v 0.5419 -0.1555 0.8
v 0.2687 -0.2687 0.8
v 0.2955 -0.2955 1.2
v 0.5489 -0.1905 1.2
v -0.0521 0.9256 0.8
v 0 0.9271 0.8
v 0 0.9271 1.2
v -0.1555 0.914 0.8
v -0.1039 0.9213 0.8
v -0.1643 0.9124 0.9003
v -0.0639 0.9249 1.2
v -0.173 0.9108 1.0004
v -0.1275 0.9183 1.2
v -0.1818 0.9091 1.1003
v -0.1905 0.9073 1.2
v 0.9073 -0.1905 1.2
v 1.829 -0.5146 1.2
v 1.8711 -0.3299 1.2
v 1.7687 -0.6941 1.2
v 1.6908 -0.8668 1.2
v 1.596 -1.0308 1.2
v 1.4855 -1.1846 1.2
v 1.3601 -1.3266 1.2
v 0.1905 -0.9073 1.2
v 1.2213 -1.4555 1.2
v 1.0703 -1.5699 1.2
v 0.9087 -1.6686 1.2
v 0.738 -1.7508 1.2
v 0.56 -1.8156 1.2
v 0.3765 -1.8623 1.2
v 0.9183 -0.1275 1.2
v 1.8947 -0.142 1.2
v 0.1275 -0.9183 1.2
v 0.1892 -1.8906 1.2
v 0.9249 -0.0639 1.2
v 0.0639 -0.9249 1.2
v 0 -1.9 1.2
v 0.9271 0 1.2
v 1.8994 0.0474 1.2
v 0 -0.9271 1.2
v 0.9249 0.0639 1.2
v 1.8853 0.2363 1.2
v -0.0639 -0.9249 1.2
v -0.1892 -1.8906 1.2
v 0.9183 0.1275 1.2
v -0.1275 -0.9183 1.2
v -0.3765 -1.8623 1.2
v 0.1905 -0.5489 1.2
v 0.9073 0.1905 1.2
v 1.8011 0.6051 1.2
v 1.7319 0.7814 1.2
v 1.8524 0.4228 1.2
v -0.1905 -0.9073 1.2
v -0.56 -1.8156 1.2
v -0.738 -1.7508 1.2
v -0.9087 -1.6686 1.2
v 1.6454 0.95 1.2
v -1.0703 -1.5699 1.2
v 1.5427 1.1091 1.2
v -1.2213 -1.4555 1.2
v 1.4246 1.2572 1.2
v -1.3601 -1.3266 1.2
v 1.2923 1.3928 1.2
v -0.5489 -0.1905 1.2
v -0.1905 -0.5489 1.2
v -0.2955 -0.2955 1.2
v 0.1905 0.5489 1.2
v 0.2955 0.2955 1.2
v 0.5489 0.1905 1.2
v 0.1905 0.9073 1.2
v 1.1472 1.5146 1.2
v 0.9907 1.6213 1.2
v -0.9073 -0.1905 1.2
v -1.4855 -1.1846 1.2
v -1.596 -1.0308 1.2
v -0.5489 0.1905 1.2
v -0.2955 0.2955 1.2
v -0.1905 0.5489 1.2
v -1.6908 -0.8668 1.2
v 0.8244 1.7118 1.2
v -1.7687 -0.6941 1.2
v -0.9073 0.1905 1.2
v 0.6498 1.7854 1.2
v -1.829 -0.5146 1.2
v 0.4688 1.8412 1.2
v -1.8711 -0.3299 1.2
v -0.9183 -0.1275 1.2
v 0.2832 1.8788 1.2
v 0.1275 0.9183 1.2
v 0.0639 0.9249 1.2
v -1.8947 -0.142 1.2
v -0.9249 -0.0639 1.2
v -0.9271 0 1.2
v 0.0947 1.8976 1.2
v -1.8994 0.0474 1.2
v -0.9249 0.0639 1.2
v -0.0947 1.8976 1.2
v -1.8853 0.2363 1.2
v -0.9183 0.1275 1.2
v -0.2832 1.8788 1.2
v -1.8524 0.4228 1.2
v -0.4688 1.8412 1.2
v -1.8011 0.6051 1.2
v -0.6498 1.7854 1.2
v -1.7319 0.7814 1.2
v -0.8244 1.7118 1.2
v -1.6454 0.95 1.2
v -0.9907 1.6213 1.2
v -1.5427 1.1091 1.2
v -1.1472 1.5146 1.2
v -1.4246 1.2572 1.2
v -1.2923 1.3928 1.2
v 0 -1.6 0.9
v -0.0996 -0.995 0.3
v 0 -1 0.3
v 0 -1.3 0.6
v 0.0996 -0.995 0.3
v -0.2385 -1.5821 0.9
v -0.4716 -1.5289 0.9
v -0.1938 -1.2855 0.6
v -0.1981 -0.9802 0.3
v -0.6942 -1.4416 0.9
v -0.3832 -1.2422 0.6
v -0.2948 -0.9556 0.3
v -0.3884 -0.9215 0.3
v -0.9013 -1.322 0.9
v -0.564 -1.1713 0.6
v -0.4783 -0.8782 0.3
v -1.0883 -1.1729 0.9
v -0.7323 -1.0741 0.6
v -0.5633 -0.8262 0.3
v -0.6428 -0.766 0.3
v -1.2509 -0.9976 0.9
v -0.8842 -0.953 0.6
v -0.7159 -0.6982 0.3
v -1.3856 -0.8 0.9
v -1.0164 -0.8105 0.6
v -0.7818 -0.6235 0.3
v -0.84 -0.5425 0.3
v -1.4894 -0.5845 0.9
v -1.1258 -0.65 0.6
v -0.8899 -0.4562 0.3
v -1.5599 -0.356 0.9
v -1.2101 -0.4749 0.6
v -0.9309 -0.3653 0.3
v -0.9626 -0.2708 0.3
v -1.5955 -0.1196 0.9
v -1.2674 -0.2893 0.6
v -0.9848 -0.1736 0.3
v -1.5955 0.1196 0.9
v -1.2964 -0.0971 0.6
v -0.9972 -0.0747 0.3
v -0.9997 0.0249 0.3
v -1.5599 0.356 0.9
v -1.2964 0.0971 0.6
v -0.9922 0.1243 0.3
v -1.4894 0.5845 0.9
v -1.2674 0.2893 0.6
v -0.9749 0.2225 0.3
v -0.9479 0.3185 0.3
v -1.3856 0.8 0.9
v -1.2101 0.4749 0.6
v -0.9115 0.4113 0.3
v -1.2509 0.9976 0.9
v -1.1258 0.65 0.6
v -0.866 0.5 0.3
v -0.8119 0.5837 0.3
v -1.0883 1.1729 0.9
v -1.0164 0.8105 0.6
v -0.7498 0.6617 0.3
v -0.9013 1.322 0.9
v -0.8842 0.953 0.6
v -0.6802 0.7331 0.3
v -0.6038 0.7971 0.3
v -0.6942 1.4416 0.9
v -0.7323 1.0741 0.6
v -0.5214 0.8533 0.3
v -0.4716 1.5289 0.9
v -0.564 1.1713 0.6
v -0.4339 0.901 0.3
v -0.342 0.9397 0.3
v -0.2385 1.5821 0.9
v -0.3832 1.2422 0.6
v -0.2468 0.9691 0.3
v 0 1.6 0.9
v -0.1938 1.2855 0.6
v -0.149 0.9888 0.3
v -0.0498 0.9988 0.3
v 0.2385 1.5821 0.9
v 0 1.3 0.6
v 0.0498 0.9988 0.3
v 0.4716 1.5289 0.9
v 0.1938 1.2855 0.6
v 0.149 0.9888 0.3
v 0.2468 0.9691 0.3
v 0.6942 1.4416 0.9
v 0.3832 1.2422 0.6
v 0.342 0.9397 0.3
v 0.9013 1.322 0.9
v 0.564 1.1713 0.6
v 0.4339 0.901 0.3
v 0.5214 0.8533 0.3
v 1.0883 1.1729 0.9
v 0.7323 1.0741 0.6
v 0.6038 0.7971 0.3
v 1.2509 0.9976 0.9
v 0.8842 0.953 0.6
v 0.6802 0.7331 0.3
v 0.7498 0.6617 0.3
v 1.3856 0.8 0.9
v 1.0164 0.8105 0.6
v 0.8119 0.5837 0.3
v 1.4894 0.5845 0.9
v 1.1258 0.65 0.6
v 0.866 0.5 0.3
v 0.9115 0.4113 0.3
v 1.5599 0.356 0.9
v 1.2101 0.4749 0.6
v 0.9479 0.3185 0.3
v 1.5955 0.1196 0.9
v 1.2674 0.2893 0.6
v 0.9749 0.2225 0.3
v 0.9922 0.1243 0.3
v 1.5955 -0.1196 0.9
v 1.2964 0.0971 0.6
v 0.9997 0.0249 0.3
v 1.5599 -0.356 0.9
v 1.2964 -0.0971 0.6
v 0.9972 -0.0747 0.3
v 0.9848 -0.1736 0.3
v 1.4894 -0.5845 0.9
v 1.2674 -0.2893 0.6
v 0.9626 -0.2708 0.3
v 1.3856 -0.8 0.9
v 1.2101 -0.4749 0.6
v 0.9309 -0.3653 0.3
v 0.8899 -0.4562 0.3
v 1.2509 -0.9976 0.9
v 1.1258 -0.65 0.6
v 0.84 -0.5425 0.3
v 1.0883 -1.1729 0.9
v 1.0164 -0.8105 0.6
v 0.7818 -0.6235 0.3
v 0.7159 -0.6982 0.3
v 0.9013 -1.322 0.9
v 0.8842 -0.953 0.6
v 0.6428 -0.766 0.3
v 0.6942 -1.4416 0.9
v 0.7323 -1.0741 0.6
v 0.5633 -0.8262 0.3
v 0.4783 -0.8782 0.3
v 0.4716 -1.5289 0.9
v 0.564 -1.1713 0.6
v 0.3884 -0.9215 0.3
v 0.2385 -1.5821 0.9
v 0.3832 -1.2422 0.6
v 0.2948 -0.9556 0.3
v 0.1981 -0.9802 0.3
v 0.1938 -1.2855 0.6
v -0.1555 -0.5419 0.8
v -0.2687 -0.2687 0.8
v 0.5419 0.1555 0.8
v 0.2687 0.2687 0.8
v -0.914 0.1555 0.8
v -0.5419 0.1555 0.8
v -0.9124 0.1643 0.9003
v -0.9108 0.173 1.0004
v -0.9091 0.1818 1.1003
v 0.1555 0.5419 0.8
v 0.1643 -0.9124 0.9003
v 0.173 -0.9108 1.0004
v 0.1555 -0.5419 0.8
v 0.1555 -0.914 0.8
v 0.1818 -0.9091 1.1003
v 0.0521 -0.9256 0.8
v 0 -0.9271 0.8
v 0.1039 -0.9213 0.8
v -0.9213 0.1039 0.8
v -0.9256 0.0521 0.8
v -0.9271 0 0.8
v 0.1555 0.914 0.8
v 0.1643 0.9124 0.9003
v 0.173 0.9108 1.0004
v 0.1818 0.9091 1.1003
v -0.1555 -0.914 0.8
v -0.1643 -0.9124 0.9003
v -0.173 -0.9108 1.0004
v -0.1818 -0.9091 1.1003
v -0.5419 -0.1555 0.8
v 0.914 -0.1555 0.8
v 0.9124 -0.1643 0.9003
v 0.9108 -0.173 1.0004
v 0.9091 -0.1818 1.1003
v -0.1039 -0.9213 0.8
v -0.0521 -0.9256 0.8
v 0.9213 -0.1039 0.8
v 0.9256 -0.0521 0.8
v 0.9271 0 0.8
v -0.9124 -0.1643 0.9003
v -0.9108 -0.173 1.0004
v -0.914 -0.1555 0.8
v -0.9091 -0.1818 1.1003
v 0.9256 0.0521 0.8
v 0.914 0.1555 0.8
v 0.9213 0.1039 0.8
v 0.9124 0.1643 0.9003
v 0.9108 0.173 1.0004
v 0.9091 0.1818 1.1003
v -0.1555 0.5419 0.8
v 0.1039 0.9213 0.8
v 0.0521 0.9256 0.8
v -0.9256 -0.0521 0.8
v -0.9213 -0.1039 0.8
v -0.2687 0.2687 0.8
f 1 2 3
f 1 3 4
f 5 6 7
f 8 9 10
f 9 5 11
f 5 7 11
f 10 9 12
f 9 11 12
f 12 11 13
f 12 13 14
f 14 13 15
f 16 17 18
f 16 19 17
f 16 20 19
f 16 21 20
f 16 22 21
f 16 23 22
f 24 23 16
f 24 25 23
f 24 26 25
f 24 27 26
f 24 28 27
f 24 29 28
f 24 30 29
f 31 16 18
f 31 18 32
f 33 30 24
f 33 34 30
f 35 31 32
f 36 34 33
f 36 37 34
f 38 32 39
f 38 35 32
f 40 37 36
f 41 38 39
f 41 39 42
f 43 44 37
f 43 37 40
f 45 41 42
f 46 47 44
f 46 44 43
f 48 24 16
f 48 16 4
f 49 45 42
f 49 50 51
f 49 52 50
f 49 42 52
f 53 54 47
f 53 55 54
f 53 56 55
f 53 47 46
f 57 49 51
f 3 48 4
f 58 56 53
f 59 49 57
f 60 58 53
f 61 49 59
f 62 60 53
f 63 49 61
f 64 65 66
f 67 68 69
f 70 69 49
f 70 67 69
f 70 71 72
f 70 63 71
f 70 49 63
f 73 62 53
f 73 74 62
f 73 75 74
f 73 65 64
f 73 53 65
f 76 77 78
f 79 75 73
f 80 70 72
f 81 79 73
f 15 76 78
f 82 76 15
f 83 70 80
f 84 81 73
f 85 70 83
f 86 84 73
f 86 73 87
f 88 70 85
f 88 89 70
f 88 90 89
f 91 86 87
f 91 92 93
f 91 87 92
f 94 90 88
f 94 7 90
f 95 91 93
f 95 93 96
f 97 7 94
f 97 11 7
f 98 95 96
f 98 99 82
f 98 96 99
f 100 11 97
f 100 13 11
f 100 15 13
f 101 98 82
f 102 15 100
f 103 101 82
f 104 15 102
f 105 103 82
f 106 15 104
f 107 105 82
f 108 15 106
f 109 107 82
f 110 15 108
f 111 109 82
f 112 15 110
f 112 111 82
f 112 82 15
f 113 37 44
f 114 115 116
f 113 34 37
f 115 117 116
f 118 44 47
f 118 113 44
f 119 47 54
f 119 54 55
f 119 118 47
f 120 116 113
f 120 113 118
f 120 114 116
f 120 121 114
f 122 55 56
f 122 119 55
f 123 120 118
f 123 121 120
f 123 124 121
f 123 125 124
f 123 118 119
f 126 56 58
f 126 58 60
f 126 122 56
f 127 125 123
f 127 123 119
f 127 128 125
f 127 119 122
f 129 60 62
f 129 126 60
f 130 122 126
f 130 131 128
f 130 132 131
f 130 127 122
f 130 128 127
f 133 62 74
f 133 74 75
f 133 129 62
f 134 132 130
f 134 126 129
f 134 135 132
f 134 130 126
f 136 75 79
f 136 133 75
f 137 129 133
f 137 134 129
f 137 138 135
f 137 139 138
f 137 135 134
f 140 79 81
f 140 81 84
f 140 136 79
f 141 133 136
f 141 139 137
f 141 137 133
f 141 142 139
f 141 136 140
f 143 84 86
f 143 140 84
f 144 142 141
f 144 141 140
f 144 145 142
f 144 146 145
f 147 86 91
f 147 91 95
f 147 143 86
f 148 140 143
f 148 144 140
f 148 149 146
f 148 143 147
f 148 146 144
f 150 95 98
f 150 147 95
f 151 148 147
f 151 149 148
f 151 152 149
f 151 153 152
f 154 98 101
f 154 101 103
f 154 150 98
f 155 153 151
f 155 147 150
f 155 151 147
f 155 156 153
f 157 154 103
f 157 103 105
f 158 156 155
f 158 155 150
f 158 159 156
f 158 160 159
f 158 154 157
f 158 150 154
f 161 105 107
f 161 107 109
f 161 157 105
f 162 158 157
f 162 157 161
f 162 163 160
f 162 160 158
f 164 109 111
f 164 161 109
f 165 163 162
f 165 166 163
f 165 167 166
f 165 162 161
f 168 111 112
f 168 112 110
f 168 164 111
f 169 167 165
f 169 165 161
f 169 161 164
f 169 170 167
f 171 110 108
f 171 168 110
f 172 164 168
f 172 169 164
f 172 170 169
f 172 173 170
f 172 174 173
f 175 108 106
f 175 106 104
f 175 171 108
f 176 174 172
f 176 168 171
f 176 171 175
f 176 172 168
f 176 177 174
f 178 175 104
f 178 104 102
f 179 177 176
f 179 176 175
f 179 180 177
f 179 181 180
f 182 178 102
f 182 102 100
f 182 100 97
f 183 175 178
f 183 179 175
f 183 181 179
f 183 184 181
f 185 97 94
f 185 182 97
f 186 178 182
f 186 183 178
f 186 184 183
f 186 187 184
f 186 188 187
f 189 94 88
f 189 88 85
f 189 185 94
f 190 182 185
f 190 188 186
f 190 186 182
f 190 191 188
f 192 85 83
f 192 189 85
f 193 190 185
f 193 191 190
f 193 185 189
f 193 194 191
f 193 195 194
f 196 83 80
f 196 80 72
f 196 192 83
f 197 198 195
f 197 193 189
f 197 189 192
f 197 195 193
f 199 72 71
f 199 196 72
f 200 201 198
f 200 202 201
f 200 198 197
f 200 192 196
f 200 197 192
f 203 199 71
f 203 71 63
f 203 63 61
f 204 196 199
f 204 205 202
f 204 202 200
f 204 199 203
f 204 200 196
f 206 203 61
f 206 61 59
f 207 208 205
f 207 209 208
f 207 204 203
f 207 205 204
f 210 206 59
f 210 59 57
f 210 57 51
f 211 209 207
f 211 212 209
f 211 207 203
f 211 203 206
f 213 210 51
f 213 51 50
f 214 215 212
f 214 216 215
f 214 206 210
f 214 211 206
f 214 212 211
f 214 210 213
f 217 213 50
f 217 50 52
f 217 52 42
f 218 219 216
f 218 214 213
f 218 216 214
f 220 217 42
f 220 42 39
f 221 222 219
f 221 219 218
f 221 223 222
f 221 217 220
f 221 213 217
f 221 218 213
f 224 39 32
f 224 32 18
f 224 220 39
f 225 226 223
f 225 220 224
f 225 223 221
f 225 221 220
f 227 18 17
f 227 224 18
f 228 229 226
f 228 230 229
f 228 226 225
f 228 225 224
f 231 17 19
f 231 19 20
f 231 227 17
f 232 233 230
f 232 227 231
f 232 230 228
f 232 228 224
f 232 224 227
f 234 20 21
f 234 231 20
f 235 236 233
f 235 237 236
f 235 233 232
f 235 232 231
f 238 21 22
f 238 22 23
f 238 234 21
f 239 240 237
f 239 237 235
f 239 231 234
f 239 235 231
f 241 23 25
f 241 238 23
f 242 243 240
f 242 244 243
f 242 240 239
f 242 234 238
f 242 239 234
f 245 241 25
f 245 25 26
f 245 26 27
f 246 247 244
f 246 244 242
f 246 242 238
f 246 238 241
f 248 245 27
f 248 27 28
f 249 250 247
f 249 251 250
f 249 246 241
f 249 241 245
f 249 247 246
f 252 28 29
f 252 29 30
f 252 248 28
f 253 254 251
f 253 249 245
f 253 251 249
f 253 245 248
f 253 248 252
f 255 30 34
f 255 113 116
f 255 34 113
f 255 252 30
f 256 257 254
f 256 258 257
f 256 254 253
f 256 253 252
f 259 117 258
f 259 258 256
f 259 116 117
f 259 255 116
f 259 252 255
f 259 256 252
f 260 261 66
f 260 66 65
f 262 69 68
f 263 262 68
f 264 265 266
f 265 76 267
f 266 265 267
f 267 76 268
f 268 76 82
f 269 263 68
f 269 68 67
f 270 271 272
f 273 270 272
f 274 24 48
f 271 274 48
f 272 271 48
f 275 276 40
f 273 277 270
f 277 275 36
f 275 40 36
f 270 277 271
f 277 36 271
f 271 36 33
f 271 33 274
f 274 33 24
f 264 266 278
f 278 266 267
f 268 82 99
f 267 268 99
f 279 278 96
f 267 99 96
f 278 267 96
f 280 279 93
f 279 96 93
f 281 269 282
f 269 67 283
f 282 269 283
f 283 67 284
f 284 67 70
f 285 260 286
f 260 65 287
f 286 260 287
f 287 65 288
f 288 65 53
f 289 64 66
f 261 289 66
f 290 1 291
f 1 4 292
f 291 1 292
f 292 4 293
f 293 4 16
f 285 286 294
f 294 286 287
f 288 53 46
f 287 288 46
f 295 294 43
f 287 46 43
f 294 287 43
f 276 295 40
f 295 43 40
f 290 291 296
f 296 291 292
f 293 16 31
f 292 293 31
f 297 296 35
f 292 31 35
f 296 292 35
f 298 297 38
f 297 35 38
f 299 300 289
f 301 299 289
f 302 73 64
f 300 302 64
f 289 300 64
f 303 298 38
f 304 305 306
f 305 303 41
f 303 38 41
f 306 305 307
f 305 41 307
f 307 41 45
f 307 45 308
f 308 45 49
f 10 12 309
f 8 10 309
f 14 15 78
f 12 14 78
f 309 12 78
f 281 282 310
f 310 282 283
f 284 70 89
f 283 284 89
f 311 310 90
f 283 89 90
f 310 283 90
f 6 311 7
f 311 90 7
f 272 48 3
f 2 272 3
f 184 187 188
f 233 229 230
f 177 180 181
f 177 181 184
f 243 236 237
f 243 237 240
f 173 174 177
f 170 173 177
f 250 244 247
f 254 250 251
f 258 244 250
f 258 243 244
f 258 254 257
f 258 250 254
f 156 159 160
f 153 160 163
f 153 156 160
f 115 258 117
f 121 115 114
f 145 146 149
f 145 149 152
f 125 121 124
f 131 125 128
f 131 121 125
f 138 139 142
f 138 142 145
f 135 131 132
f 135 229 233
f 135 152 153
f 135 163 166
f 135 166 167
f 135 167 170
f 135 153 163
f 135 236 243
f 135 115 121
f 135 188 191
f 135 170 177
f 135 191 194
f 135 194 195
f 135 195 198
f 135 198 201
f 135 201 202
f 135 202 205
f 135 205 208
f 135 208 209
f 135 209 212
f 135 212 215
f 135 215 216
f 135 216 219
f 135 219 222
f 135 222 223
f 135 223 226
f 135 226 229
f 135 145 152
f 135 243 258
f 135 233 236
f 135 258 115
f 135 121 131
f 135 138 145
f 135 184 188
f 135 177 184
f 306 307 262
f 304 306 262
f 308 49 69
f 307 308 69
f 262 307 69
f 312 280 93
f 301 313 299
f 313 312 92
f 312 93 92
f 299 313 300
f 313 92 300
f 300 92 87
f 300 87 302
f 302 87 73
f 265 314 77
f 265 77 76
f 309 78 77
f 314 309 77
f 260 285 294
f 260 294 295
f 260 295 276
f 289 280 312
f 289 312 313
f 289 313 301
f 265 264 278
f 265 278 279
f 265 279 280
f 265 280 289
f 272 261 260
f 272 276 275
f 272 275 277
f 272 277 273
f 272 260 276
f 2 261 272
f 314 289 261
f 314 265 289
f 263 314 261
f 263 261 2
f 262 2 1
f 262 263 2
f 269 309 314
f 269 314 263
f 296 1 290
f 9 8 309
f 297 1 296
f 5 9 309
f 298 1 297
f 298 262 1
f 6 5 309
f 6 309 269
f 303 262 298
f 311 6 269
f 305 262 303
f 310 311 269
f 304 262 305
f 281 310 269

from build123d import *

# Parameters (mm, degrees)
CUT_EXTRUDE1_DEPTH = 0.4
CIRPATTERN1_COUNT  = 4
DRAFT2_ANGLE       = 5


with BuildPart() as part:
    # Sketch3 → Revolve1 (revolve)
    with BuildSketch(Plane(origin=(0, 0, 0), x_dir=(0, 0, -1), z_dir=(1, 0, 0)), mode=Mode.PRIVATE) as revolve1_sk:
        Polygon((-1.2, 0), (-1.2, 1.9), (-0.3, 1), (-0.3, 0), align=None)
    revolve(revolve1_sk.sketch.rotate(Axis((0, 0, 1.2), (0, 0, -1)), 180), axis=Axis((0, 0, 1.2), (0, 0, -1)))

    # Sketch4 → Cut-Extrude1 (cut)
    with BuildSketch(Plane.XY.offset(1.2)):
        with BuildLine():
            Line((0, 0), (0.9271, 0))
            ThreePointArc((0.9271, 0), (0.92214099, 0.095762227), (0.907317012, 0.1905))
            Line((0.907317012, 0.1905), (0.548908506, 0.1905))
            Line((0.548908506, 0.1905), (0.295475421, 0.295475421))
            Line((0.295475421, 0.295475421), (0.1905, 0.548908506))
            Line((0.1905, 0.548908506), (0.1905, 0.907317012))
            ThreePointArc((0.1905, 0.907317012), (0.095762227, 0.92214099), (0, 0.9271))
            Line((0, 0.9271), (0, 0))
        make_face()
    cut_extrude1 = extrude(amount=-CUT_EXTRUDE1_DEPTH, mode=Mode.SUBTRACT)

    # CirPattern1: Cut-Extrude1 ×4 about axis
    cirpattern1_axis = Axis((0, 0, 0), (0, 0, 1))
    for i in range(1, CIRPATTERN1_COUNT):
        add(cut_extrude1.rotate(cirpattern1_axis, i * 360 / CIRPATTERN1_COUNT), mode=Mode.SUBTRACT)

    # Draft2
    draft2_faces = [part.faces().sort_by_distance(p)[0] for p in [
        (-0.728112759, 0.1905, 1),
        (-0.422191963, 0.24298771, 1),
        (-0.24298771, 0.422191963, 1),
        (-0.1905, 0.728112759, 1),
        (0.1905, 0.728112759, 1),
        (0.24298771, 0.422191963, 1),
        (0.422191963, 0.24298771, 1),
        (0.728112759, 0.1905, 1),
        (0.728112759, -0.1905, 1),
        (0.422191963, -0.24298771, 1),
        (0.24298771, -0.422191963, 1),
        (0.1905, -0.728112759, 1),
        (-0.1905, -0.728112759, 1),
        (-0.24298771, -0.422191963, 1),
        (-0.422191963, -0.24298771, 1),
        (-0.728112759, -0.1905, 1),
    ]]
    draft(draft2_faces, Plane(origin=(0, 0, 1.2), x_dir=(0, 1, 0), z_dir=(0, 0, 1)), DRAFT2_ANGLE)


solid = part.part
